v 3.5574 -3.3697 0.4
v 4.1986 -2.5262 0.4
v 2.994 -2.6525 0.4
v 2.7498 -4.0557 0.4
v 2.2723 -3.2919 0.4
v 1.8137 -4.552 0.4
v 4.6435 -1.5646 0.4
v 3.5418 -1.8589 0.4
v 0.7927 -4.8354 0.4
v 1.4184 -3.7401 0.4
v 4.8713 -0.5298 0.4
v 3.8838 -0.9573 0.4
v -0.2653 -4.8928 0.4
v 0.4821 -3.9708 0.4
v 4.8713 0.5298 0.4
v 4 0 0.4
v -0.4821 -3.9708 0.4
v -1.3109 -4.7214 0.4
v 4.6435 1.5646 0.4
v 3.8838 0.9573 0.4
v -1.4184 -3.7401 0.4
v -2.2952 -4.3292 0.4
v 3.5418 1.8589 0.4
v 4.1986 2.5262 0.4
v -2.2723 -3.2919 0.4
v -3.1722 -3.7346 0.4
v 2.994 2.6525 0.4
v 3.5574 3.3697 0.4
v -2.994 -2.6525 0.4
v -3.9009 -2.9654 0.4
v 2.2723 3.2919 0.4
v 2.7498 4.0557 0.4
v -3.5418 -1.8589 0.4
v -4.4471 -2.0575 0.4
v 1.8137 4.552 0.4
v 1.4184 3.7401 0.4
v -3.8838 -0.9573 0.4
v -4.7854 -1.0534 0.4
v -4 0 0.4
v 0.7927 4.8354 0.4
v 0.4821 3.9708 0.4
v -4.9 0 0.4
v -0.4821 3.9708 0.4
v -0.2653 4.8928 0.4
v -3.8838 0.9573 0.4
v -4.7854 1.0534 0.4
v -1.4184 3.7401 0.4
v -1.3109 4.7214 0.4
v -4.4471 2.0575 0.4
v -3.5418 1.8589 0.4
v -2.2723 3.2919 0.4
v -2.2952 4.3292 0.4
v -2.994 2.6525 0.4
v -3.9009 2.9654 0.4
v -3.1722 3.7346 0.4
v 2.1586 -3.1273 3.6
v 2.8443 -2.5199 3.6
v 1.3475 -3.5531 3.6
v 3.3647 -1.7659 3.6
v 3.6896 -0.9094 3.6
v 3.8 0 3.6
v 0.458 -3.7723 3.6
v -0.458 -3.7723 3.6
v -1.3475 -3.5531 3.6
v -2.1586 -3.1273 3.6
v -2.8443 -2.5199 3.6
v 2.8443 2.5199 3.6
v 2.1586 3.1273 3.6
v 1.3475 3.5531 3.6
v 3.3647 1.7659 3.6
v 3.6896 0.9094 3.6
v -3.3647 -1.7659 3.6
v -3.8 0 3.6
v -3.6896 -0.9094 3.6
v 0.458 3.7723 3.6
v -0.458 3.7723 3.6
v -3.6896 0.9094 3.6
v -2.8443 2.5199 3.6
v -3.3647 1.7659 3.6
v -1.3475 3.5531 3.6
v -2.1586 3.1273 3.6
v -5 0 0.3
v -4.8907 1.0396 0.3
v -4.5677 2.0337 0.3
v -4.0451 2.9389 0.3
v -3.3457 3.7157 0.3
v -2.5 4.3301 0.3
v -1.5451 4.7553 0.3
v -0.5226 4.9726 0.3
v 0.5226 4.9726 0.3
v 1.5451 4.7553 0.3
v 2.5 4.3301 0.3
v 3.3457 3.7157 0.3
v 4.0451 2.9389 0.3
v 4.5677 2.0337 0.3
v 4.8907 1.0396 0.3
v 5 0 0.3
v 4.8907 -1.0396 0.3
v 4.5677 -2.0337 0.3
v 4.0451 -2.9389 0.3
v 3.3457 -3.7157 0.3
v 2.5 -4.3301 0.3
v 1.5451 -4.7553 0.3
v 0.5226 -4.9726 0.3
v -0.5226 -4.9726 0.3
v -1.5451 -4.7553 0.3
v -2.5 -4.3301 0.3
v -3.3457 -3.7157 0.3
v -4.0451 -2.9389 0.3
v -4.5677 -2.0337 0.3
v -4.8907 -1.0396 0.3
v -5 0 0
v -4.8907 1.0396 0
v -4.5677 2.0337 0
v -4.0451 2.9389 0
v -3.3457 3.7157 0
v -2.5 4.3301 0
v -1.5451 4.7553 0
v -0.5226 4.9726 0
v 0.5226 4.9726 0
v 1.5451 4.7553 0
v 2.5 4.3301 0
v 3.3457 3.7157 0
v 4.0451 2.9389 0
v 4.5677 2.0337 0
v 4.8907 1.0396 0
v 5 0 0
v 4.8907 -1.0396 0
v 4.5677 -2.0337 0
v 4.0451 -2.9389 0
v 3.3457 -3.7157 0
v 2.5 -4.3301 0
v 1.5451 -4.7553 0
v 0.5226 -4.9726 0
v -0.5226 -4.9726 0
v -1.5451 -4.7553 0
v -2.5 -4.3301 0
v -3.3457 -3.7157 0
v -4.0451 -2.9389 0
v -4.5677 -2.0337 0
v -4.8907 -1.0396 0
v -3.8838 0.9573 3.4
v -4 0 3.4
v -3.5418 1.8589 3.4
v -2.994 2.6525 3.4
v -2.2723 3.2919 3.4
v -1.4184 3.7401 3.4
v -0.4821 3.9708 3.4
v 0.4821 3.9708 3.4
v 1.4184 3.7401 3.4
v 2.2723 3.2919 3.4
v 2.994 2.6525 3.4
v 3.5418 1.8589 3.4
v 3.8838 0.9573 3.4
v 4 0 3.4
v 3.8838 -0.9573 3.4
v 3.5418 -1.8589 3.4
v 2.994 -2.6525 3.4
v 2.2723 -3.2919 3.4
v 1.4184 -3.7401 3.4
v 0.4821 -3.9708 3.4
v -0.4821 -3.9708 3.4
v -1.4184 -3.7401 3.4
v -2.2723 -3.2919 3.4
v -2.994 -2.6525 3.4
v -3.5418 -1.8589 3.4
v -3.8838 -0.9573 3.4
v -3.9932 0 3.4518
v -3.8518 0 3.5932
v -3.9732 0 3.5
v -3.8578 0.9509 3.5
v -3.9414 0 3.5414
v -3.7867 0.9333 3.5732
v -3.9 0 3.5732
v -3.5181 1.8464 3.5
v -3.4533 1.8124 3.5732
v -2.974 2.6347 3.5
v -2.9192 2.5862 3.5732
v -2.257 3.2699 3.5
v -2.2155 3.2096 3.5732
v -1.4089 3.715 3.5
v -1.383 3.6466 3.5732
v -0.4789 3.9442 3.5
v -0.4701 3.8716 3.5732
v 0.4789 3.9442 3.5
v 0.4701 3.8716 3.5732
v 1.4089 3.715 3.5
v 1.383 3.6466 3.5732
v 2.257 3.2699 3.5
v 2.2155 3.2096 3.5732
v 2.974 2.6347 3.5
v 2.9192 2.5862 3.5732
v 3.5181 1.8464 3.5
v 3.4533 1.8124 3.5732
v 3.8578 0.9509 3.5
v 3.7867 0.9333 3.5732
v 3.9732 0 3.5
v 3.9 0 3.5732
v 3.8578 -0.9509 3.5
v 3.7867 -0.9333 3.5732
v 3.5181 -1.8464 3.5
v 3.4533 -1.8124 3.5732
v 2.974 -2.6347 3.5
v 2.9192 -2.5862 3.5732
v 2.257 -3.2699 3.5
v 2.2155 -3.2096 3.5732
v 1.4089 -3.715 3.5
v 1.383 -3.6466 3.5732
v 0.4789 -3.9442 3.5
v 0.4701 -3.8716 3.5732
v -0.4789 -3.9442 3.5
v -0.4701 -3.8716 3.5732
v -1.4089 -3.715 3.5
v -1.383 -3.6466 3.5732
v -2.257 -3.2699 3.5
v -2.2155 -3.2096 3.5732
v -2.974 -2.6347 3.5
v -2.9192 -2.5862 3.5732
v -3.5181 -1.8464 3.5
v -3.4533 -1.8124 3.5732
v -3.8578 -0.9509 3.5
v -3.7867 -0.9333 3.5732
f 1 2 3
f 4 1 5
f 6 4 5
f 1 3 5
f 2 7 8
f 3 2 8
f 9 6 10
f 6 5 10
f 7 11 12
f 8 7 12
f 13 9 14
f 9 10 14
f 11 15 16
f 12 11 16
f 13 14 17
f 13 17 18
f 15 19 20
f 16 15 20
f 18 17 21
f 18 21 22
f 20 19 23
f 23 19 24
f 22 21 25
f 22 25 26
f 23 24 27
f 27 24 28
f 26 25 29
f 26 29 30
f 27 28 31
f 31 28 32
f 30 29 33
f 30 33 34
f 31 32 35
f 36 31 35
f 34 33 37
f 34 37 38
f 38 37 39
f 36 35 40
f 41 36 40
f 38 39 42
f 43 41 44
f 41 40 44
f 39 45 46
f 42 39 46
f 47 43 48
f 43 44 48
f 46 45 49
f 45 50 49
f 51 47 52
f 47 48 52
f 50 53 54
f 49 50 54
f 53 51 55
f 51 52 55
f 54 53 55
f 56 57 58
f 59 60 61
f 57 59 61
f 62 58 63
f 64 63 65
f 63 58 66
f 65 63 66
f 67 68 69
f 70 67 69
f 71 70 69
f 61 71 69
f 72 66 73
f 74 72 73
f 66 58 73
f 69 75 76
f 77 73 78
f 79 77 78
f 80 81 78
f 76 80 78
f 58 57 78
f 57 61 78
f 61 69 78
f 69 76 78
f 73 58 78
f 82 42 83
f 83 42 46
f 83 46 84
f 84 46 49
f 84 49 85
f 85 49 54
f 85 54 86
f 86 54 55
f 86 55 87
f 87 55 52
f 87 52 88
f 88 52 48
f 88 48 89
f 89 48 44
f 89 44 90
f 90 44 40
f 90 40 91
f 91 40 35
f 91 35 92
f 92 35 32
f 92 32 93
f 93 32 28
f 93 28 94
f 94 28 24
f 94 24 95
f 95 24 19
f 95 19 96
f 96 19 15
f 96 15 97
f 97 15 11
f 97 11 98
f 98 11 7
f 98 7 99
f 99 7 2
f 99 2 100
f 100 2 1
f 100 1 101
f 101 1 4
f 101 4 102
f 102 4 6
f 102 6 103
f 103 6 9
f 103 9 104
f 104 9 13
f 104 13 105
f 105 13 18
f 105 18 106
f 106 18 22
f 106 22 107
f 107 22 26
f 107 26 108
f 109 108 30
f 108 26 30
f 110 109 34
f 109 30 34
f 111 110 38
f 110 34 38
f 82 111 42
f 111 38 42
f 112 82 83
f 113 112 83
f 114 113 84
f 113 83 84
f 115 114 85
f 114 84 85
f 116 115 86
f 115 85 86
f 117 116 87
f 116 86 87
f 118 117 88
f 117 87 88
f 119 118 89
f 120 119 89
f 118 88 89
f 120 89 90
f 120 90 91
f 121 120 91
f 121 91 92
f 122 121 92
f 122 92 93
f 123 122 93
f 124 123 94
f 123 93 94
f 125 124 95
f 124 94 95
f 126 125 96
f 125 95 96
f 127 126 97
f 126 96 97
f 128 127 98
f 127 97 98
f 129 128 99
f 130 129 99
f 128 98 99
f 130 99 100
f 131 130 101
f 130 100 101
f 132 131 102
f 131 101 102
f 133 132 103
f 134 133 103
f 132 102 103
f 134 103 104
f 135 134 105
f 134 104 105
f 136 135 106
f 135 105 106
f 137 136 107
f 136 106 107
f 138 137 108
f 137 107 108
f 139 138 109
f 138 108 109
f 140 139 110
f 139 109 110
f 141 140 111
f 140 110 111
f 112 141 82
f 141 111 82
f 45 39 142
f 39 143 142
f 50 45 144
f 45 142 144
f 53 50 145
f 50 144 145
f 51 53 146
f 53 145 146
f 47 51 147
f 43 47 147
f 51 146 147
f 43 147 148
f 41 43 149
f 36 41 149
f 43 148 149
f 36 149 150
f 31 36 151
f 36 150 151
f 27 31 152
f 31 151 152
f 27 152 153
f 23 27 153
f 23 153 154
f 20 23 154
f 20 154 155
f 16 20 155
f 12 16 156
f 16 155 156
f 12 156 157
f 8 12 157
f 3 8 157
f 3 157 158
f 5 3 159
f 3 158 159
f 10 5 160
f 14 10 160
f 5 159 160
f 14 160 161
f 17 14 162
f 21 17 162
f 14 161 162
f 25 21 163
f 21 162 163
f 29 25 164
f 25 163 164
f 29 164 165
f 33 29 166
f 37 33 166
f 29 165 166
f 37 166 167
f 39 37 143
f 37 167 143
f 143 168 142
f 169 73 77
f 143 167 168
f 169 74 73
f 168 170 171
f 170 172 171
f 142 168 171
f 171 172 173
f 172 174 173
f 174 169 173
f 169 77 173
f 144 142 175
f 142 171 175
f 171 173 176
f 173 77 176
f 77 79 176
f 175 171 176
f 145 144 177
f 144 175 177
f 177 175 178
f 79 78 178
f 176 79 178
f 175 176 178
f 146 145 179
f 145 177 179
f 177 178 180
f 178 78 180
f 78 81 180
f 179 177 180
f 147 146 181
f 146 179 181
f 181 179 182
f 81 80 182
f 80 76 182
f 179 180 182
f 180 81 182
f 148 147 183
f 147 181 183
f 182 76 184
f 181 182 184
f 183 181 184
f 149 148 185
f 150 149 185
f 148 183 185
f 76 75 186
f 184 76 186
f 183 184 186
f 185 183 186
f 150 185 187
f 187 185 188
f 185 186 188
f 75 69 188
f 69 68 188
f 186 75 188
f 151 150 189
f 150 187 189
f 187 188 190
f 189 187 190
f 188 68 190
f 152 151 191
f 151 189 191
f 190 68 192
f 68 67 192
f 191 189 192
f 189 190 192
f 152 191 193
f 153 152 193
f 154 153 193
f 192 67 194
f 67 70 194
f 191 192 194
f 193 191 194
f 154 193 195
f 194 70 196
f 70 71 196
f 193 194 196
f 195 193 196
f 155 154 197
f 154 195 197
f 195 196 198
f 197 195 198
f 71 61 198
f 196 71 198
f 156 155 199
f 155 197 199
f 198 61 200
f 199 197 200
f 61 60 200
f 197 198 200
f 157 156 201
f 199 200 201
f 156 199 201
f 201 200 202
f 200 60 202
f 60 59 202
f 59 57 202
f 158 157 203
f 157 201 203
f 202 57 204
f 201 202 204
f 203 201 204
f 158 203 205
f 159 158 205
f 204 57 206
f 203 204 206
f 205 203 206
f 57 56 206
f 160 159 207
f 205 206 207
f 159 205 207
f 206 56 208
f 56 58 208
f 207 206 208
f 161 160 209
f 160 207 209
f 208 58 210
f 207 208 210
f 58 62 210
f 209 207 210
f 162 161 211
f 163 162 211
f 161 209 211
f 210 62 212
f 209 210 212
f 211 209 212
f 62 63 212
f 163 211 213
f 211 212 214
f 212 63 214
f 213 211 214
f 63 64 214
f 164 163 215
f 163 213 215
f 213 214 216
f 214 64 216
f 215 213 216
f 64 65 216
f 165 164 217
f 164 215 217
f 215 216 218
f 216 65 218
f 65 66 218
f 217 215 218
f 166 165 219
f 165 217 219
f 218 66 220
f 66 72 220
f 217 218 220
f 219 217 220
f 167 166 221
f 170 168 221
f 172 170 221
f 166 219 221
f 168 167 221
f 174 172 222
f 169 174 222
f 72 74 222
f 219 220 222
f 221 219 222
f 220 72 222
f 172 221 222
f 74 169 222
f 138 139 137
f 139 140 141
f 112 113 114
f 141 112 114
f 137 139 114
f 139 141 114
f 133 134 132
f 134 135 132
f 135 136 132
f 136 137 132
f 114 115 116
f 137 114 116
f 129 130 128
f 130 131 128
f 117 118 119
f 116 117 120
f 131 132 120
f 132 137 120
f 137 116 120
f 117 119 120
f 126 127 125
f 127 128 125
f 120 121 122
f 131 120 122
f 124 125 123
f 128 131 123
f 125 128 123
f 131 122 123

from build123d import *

# Parameters (mm, degrees)
CHANFREIN1_SIZE = 0.1


with BuildPart() as part:
    # Esquisse1 → Révolution1 (revolve)
    with BuildSketch(Plane.XZ, mode=Mode.PRIVATE) as r_volution1_sk:
        with BuildLine():
            Line((3.8, 3.6), (0, 3.6))
            Line((0, 3.6), (0, 0))
            Line((0, 0), (5, 0))
            Line((5, 0), (5, 0.4))
            Line((5, 0.4), (4, 0.4))
            Line((4, 0.4), (4, 3.4))
            ThreePointArc((4, 3.4), (3.941421356, 3.541421356), (3.8, 3.6))
        make_face()
    revolve(r_volution1_sk.sketch.rotate(Axis((0, 0, 3.6), (0, 0, -1)), 180), axis=Axis((0, 0, 3.6), (0, 0, -1)))

    # Chanfrein1
    chanfrein1_edges = [part.edges().sort_by_distance(p)[0] for p in [
        (5, 0, 0.4),
    ]]
    chamfer(chanfrein1_edges, length=CHANFREIN1_SIZE)


solid = part.part
